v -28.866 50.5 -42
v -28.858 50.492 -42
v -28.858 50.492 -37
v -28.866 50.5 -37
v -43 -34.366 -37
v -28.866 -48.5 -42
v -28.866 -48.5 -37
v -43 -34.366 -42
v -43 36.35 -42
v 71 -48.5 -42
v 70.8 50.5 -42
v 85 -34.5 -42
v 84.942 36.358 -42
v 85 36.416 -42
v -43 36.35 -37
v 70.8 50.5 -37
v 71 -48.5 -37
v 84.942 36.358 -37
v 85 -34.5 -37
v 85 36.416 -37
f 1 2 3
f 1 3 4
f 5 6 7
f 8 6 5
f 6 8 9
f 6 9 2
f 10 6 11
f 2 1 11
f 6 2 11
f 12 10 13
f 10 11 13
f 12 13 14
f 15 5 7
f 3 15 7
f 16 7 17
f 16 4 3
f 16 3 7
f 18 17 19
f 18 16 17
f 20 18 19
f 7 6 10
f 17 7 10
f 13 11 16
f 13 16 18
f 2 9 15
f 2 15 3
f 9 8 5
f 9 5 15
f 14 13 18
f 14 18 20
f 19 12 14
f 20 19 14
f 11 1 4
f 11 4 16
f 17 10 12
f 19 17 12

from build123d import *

# Parameters (mm, degrees)
BOX055_W               = 20
BOX055_H               = 20
BOX055_DEPTH           = 20
BOX055_PLACEMENT_ANGLE = 45
BOX056_W               = 20
BOX056_H               = 20
BOX056_DEPTH           = 20
BOX056_PLACEMENT_ANGLE = 45
BOX053_W               = 20
BOX053_H               = 20
BOX053_DEPTH           = 20
BOX053_PLACEMENT_ANGLE = -45
BOX054_W               = 20
BOX054_H               = 20
BOX054_DEPTH           = 20
BOX054_PLACEMENT_ANGLE = -45
BOX052_W               = 128
BOX052_H               = 99
BOX052_DEPTH           = 5


with BuildPart() as cubo041:
    # Box055 → Box055 (new body)
    with BuildSketch(Plane.XY):
        with Locations((10, 10)):
            Rectangle(BOX055_W, BOX055_H)
    extrude(amount=BOX055_DEPTH)


with BuildPart() as cubo041_1:
    # Box055 placement: moved
    add(cubo041.part.moved(Location((-14, -28.65, 0))).rotate(Axis((-14, -28.65, 0), (0, 0, 1)), BOX055_PLACEMENT_ANGLE))


with BuildPart() as cubo042:
    # Box056 → Box056 (new body)
    with BuildSketch(Plane.XY):
        with Locations((10, 10)):
            Rectangle(BOX056_W, BOX056_H)
    extrude(amount=BOX056_DEPTH)


with BuildPart() as cubo042_1:
    # Box056 placement: moved
    add(cubo042.part.moved(Location((-14, 70.35, 0))).rotate(Axis((-14, 70.35, 0), (0, 0, 1)), BOX056_PLACEMENT_ANGLE))


with BuildPart() as cubo039:
    # Box053 → Box053 (new body)
    with BuildSketch(Plane.XY):
        with Locations((10, 10)):
            Rectangle(BOX053_W, BOX053_H)
    extrude(amount=BOX053_DEPTH)


with BuildPart() as cubo039_1:
    # Box053 placement: moved
    add(cubo039.part.moved(Location((100, -14.5, 0))).rotate(Axis((100, -14.5, 0), (0, 0, 1)), BOX053_PLACEMENT_ANGLE))


with BuildPart() as fusion027:
    # Box054 → Box054 (new body)
    with BuildSketch(Plane.XY):
        with Locations((10, 10)):
            Rectangle(BOX054_W, BOX054_H)
    extrude(amount=BOX054_DEPTH)


with BuildPart() as fusion027_1:
    # Box054 placement: moved
    add(fusion027.part.moved(Location((99.8, 84.5, 0))).rotate(Axis((99.8, 84.5, 0), (0, 0, 1)), BOX054_PLACEMENT_ANGLE))

    # Fusion027: union Cubo041, Cubo042, Cubo039
    add(cubo041_1.part)
    add(cubo042_1.part)
    add(cubo039_1.part)


with BuildPart() as base_fresada:
    # Box052 → Box052 (new body)
    with BuildSketch(Plane(origin=(-14, -14.5, 0), x_dir=(1, 0, 0), z_dir=(0, 0, 1))):
        with Locations((64, 49.5)):
            Rectangle(BOX052_W, BOX052_H)
    extrude(amount=BOX052_DEPTH)

    # Cut037: cut Fusion027
    add(fusion027_1.part, mode=Mode.SUBTRACT)


with BuildPart() as base_fresada_1:
    # Cut037 placement: moved
    add(base_fresada.part.moved(Location((-29, -34, -42))))


solid = base_fresada_1.part
